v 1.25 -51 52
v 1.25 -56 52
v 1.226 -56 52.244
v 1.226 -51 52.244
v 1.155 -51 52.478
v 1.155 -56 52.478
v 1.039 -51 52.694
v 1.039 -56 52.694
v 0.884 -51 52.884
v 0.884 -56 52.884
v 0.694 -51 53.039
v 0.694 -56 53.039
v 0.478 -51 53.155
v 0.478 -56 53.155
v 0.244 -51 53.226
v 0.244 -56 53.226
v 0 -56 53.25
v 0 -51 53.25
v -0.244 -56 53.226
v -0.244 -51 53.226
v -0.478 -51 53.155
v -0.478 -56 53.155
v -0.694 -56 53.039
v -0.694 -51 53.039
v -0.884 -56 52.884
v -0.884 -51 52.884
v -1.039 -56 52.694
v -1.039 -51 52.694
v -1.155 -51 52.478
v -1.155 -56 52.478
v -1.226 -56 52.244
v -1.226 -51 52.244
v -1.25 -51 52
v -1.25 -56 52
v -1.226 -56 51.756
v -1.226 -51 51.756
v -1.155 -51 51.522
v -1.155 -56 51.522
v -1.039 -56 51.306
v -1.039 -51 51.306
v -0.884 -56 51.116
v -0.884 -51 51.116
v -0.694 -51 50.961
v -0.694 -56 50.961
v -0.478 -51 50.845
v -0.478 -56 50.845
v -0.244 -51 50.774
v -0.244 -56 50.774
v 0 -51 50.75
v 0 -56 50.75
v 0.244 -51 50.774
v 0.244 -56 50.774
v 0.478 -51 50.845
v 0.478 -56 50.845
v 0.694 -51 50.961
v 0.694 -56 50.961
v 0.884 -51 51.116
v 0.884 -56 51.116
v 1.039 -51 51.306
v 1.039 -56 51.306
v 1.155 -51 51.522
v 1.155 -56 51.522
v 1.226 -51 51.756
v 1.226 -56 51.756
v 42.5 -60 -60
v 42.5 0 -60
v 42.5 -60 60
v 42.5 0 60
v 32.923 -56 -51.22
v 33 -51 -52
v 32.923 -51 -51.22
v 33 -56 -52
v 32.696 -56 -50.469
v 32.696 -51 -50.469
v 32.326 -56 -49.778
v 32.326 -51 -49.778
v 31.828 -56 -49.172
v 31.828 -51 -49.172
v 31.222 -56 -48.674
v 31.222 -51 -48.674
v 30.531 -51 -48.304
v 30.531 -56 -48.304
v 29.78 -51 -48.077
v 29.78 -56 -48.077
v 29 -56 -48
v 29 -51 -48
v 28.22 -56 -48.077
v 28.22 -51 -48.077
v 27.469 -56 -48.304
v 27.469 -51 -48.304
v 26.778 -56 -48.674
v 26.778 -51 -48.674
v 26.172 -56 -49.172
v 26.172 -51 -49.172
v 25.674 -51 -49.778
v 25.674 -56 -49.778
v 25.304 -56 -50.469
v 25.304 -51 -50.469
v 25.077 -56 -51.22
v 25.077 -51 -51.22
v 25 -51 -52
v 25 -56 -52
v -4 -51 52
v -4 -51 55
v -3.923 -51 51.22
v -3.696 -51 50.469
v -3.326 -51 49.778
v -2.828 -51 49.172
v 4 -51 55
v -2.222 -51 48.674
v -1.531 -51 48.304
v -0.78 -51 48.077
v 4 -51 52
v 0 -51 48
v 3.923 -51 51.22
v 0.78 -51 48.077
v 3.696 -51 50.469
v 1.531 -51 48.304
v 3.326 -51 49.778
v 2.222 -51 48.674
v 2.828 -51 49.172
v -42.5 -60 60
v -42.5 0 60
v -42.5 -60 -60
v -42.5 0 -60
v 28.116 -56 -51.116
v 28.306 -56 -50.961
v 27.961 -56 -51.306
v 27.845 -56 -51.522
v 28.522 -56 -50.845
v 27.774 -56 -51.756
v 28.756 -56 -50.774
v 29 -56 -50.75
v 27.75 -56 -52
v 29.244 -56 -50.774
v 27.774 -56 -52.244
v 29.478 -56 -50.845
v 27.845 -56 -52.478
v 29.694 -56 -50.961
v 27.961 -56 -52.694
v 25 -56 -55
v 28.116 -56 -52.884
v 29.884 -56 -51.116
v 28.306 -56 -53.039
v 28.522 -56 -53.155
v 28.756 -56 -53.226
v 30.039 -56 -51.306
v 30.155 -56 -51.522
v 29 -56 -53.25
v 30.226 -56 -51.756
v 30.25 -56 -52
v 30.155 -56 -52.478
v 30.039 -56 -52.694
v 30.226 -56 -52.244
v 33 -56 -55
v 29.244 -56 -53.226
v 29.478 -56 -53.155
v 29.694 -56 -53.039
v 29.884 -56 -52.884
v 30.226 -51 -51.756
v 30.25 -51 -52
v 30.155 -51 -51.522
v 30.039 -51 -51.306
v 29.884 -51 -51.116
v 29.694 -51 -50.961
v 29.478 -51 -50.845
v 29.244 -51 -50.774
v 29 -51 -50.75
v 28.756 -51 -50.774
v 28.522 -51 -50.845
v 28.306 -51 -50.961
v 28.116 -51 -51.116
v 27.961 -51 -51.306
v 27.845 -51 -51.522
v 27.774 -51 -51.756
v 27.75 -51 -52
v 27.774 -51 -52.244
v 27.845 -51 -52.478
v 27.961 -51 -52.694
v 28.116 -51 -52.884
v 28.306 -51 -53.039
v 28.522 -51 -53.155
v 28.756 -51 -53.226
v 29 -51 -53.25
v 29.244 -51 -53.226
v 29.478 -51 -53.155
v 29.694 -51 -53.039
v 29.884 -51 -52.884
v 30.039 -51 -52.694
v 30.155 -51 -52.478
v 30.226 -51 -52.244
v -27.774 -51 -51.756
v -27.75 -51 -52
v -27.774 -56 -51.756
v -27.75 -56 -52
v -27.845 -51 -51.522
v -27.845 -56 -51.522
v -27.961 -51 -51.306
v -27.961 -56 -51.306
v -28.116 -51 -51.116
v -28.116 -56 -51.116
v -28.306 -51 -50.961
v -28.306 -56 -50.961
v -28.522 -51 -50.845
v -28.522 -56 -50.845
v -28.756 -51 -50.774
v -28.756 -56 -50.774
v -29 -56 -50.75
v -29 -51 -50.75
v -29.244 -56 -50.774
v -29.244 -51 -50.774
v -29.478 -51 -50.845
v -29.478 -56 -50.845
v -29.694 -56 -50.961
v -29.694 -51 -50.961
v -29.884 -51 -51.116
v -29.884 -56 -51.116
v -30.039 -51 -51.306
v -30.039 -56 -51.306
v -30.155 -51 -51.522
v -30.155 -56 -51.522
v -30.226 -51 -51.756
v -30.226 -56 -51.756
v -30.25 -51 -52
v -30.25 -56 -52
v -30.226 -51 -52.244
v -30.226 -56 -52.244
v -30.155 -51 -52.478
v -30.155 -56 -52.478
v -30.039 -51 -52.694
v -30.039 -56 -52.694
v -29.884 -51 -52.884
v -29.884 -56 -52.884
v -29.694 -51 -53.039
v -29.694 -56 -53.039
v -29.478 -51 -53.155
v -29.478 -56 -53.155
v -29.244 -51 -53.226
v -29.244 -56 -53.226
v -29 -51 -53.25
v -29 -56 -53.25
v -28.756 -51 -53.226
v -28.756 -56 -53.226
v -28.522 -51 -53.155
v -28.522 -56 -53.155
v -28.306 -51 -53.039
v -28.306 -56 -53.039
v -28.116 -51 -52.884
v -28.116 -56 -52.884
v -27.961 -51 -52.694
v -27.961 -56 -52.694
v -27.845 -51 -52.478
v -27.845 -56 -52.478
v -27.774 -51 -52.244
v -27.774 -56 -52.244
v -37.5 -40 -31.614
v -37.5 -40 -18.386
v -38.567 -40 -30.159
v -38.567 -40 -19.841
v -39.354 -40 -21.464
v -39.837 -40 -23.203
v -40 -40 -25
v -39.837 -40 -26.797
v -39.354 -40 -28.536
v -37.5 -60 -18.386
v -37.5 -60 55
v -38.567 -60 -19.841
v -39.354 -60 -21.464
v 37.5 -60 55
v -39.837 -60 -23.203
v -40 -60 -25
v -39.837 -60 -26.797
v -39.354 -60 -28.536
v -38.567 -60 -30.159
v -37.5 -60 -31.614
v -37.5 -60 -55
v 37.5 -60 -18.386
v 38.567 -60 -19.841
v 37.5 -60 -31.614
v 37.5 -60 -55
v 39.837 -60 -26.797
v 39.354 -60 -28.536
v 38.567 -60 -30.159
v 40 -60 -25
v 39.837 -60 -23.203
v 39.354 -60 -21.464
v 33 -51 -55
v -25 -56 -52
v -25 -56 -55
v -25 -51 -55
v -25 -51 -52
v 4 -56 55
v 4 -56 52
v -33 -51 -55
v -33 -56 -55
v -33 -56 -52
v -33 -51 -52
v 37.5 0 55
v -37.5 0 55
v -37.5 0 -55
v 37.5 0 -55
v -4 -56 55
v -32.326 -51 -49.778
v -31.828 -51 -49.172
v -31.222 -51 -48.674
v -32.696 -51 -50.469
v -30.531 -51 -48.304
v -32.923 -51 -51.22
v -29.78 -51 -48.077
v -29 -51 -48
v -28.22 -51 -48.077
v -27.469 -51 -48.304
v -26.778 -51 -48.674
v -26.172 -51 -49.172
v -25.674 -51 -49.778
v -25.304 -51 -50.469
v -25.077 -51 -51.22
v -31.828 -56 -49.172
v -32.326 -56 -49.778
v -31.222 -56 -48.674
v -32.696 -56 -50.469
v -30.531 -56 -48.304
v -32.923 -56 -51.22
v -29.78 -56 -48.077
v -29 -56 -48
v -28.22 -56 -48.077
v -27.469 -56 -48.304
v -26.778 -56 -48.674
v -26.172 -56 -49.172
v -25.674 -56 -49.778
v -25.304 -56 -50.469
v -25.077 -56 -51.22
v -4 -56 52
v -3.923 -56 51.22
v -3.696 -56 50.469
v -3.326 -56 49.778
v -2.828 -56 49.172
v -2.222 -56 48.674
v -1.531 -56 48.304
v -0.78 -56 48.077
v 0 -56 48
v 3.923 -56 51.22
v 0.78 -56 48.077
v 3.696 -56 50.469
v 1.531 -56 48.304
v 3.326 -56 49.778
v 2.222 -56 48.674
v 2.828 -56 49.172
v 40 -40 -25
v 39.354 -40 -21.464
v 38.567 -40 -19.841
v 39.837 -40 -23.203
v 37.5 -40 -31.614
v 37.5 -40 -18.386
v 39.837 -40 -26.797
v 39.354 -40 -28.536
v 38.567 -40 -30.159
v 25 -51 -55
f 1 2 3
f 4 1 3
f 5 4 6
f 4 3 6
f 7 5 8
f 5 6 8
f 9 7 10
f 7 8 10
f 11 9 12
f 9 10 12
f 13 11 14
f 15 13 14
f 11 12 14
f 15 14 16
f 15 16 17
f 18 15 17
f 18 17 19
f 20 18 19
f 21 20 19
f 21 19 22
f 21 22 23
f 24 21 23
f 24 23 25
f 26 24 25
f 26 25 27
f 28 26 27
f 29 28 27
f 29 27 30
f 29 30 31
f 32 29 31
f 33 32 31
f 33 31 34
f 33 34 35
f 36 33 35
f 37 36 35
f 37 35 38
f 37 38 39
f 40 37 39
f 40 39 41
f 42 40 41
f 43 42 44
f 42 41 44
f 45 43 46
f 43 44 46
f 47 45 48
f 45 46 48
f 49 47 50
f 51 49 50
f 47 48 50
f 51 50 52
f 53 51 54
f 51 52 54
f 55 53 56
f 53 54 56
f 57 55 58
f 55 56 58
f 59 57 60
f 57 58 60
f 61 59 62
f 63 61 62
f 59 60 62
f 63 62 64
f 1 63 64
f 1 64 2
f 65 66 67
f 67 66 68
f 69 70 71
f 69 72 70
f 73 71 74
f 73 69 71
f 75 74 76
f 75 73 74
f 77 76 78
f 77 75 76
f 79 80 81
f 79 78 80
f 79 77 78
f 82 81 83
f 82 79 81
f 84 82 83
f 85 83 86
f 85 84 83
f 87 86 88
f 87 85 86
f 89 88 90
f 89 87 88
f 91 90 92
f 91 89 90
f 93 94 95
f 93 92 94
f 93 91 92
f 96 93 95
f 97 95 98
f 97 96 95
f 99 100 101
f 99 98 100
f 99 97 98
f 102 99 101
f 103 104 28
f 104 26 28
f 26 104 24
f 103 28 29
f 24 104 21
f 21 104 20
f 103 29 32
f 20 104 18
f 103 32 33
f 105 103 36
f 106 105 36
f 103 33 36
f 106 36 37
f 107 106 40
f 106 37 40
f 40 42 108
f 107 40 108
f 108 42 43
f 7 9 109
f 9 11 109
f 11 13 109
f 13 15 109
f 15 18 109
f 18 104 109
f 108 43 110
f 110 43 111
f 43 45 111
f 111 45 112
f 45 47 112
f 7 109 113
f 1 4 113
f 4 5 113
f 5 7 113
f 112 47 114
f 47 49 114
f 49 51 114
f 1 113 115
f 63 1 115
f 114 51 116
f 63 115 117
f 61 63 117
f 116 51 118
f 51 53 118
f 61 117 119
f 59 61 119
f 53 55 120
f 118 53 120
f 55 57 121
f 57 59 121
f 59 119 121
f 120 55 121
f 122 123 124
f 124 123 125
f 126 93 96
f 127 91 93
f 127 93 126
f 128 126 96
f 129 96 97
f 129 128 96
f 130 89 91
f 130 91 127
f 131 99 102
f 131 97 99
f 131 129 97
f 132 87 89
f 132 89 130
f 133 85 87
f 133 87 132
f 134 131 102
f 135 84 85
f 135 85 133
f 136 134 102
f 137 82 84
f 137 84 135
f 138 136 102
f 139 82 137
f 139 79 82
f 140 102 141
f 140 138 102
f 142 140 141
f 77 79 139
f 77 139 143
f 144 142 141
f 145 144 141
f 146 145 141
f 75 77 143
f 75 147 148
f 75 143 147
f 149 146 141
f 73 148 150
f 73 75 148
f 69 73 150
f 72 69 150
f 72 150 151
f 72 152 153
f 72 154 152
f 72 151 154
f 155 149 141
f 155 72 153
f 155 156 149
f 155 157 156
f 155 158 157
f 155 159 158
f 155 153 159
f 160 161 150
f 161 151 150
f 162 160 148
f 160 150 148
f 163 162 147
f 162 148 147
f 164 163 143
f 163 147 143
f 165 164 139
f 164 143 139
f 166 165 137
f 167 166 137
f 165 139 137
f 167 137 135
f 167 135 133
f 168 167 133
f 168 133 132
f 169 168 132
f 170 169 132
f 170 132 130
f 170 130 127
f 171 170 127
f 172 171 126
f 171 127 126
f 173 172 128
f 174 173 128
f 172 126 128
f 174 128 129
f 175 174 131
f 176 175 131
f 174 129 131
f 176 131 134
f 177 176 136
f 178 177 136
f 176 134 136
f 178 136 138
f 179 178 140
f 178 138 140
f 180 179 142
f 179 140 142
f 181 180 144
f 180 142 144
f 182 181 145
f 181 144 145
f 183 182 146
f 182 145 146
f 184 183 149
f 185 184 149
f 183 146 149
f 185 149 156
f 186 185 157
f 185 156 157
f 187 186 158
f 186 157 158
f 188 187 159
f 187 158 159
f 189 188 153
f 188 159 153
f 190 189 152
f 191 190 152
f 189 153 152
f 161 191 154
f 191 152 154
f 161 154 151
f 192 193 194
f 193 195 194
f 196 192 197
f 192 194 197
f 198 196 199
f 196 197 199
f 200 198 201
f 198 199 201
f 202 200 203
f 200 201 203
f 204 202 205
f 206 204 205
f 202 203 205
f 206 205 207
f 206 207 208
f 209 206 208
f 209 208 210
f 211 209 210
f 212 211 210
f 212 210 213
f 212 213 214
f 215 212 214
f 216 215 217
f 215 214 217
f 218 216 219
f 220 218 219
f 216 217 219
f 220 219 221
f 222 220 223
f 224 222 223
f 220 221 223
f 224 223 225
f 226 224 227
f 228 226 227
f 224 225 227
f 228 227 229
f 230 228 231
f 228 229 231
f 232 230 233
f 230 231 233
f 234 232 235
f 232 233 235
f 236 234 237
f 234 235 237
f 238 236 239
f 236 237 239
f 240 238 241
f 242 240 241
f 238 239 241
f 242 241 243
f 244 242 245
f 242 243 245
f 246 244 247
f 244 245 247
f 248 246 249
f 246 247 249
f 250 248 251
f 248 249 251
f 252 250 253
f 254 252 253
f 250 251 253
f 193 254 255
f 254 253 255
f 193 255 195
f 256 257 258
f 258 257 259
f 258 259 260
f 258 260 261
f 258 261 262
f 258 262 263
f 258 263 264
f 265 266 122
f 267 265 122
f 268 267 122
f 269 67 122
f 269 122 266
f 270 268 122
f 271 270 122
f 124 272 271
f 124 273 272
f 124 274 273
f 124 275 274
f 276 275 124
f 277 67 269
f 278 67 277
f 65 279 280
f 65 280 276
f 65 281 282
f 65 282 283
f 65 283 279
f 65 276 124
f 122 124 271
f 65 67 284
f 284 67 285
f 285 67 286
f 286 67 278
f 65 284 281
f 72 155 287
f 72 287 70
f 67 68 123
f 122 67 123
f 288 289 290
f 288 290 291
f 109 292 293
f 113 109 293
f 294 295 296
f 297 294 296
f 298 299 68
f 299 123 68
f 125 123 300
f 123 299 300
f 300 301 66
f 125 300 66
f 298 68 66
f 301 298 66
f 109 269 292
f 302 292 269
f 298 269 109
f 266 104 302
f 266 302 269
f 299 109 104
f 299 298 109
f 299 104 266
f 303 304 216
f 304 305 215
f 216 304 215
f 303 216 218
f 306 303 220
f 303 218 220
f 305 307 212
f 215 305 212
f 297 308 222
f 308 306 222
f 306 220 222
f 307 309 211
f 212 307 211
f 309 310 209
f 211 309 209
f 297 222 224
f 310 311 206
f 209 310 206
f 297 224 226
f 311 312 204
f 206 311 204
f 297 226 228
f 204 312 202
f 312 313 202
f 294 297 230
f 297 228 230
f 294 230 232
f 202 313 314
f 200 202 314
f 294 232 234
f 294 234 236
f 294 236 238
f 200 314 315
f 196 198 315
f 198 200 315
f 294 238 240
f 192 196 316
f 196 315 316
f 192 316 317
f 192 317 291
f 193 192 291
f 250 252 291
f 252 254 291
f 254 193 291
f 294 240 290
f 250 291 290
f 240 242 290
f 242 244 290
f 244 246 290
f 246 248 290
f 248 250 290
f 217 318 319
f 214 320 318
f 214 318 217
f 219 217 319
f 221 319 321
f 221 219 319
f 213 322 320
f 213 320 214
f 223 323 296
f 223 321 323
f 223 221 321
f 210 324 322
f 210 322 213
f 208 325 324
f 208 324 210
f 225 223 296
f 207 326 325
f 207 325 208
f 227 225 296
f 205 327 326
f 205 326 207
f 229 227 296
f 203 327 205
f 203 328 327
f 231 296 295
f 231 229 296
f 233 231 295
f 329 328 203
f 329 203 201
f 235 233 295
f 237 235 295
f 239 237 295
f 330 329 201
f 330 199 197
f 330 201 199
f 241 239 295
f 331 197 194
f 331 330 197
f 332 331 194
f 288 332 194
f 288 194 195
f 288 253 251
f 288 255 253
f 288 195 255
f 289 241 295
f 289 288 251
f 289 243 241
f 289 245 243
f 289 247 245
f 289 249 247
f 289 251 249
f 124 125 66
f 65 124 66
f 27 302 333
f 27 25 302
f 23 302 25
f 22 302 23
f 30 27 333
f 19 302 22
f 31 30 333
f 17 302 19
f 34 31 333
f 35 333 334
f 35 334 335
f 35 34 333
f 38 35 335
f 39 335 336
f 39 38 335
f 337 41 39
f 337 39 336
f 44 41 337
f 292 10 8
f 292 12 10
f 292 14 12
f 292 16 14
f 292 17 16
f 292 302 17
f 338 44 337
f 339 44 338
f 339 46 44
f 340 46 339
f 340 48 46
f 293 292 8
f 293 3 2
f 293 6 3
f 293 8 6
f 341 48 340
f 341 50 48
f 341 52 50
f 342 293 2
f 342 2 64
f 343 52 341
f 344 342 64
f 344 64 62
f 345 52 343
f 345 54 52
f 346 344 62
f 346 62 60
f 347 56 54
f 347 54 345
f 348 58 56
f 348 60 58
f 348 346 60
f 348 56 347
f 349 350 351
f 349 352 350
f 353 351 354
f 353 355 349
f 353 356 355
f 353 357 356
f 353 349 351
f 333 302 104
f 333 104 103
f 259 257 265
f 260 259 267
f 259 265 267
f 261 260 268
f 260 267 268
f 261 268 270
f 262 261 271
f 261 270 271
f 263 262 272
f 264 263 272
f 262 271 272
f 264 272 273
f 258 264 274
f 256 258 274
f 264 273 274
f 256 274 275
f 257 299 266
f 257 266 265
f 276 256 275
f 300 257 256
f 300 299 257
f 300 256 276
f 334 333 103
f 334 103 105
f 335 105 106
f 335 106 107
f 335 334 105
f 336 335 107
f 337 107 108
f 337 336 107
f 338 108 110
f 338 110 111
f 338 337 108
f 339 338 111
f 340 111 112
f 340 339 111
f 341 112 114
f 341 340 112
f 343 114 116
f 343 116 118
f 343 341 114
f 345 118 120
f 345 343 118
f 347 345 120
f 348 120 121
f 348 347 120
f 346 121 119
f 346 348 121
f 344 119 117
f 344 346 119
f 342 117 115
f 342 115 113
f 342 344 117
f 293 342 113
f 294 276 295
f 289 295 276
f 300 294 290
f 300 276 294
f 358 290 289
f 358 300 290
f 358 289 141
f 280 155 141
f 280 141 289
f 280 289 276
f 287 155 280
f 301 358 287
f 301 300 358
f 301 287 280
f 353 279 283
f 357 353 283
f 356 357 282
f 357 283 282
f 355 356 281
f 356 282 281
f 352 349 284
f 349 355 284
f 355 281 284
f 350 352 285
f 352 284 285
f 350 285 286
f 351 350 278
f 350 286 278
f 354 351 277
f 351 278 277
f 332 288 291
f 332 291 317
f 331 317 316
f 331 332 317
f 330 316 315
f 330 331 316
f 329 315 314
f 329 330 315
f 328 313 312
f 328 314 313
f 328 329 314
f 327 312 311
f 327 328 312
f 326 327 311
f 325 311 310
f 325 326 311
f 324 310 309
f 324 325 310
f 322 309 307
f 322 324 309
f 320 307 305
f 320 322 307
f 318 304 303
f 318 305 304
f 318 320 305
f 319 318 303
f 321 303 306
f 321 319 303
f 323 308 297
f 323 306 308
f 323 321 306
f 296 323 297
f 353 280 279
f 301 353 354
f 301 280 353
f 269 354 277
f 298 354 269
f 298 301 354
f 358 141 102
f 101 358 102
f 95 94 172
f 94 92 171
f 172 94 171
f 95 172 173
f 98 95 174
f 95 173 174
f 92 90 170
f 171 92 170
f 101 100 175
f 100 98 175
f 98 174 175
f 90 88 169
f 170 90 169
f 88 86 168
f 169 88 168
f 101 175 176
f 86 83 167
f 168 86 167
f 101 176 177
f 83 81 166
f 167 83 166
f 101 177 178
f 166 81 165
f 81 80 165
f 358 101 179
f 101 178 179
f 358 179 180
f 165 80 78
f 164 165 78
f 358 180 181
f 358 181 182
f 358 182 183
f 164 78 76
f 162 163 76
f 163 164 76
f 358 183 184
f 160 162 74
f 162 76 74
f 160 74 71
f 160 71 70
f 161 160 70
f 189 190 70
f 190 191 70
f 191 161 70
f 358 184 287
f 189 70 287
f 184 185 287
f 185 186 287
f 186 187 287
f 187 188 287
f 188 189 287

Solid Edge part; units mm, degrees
sketch "Sketch1" plane through (0, 0, 0) normal (0, -1, 0) x (1, 0, 0)
  line L0 (-37.5, -55) -> (37.5, -55)
  line L1 (37.5, -55) -> (37.5, 55)
  line L2 (37.5, 55) -> (-37.5, 55)
  line L3 (-37.5, 55) -> (-37.5, -55)
  line L4 (-42.5, -60) -> (42.5, -60)
  line L5 (42.5, -60) -> (42.5, 60)
  line L6 (42.5, 60) -> (-42.5, 60)
  line L7 (-42.5, 60) -> (-42.5, -60)
  dimension "D1" = 85
  dimension "D2" = 120
  dimension "D3" = 5
  dimension "D4" = 5
extrude "Protrusion1" add sketch "Sketch1" along normal blind 60
sketch "Sketch2" plane through (0, -60, 0) normal (0, -1, 0) x (1, 0, 0)
  circle A0 centre (30, -25) radius 10
  circle A1 centre (-30, -25) radius 10
  dimension "D1" = 20
  dimension "D2" = 12.5
  dimension "D3" = 35
  dimension "D4" = 35
  dimension "D5" = 12.5
extrude "camera_cut" cut sketch "Sketch2" against normal blind 20
sketch "Sketch3" plane through (0, -56, 0) normal (0, -1, 0) x (1, 0, 0)
  line L0 (-33, -55) -> (-25, -55)
  line L1 (-25, -55) -> (-25, -52)
  arc A0 (-33, -52) -> (-25, -52) centre (-29, -52) cw
  line L2 (-33, -55) -> (-33, -52)
  circle A1 centre (0, 52) radius 1.25
  circle A2 centre (-29, -52) radius 1.25
  line L3 (25, -55) -> (33, -55)
  line L4 (33, -55) -> (33, -52)
  arc A3 (25, -52) -> (33, -52) centre (29, -52) cw
  line L5 (25, -55) -> (25, -52)
  circle A4 centre (29, -52) radius 1.25
  arc A5 (-4, 52) -> (4, 52) centre (0, 52) ccw
  line L6 (4, 55) -> (4, 52)
  line L7 (-4, 55) -> (4, 55)
  line L8 (-4, 55) -> (-4, 52)
  dimension "D1" = 8
  dimension "D2" = 4
  dimension "D3" = 3
  dimension "D4" = 2.5
  dimension "D5" = 50
extrude "mounting_bottom" add sketch "Sketch3" against normal blind 5
properties material "Nylon, allgemein"
